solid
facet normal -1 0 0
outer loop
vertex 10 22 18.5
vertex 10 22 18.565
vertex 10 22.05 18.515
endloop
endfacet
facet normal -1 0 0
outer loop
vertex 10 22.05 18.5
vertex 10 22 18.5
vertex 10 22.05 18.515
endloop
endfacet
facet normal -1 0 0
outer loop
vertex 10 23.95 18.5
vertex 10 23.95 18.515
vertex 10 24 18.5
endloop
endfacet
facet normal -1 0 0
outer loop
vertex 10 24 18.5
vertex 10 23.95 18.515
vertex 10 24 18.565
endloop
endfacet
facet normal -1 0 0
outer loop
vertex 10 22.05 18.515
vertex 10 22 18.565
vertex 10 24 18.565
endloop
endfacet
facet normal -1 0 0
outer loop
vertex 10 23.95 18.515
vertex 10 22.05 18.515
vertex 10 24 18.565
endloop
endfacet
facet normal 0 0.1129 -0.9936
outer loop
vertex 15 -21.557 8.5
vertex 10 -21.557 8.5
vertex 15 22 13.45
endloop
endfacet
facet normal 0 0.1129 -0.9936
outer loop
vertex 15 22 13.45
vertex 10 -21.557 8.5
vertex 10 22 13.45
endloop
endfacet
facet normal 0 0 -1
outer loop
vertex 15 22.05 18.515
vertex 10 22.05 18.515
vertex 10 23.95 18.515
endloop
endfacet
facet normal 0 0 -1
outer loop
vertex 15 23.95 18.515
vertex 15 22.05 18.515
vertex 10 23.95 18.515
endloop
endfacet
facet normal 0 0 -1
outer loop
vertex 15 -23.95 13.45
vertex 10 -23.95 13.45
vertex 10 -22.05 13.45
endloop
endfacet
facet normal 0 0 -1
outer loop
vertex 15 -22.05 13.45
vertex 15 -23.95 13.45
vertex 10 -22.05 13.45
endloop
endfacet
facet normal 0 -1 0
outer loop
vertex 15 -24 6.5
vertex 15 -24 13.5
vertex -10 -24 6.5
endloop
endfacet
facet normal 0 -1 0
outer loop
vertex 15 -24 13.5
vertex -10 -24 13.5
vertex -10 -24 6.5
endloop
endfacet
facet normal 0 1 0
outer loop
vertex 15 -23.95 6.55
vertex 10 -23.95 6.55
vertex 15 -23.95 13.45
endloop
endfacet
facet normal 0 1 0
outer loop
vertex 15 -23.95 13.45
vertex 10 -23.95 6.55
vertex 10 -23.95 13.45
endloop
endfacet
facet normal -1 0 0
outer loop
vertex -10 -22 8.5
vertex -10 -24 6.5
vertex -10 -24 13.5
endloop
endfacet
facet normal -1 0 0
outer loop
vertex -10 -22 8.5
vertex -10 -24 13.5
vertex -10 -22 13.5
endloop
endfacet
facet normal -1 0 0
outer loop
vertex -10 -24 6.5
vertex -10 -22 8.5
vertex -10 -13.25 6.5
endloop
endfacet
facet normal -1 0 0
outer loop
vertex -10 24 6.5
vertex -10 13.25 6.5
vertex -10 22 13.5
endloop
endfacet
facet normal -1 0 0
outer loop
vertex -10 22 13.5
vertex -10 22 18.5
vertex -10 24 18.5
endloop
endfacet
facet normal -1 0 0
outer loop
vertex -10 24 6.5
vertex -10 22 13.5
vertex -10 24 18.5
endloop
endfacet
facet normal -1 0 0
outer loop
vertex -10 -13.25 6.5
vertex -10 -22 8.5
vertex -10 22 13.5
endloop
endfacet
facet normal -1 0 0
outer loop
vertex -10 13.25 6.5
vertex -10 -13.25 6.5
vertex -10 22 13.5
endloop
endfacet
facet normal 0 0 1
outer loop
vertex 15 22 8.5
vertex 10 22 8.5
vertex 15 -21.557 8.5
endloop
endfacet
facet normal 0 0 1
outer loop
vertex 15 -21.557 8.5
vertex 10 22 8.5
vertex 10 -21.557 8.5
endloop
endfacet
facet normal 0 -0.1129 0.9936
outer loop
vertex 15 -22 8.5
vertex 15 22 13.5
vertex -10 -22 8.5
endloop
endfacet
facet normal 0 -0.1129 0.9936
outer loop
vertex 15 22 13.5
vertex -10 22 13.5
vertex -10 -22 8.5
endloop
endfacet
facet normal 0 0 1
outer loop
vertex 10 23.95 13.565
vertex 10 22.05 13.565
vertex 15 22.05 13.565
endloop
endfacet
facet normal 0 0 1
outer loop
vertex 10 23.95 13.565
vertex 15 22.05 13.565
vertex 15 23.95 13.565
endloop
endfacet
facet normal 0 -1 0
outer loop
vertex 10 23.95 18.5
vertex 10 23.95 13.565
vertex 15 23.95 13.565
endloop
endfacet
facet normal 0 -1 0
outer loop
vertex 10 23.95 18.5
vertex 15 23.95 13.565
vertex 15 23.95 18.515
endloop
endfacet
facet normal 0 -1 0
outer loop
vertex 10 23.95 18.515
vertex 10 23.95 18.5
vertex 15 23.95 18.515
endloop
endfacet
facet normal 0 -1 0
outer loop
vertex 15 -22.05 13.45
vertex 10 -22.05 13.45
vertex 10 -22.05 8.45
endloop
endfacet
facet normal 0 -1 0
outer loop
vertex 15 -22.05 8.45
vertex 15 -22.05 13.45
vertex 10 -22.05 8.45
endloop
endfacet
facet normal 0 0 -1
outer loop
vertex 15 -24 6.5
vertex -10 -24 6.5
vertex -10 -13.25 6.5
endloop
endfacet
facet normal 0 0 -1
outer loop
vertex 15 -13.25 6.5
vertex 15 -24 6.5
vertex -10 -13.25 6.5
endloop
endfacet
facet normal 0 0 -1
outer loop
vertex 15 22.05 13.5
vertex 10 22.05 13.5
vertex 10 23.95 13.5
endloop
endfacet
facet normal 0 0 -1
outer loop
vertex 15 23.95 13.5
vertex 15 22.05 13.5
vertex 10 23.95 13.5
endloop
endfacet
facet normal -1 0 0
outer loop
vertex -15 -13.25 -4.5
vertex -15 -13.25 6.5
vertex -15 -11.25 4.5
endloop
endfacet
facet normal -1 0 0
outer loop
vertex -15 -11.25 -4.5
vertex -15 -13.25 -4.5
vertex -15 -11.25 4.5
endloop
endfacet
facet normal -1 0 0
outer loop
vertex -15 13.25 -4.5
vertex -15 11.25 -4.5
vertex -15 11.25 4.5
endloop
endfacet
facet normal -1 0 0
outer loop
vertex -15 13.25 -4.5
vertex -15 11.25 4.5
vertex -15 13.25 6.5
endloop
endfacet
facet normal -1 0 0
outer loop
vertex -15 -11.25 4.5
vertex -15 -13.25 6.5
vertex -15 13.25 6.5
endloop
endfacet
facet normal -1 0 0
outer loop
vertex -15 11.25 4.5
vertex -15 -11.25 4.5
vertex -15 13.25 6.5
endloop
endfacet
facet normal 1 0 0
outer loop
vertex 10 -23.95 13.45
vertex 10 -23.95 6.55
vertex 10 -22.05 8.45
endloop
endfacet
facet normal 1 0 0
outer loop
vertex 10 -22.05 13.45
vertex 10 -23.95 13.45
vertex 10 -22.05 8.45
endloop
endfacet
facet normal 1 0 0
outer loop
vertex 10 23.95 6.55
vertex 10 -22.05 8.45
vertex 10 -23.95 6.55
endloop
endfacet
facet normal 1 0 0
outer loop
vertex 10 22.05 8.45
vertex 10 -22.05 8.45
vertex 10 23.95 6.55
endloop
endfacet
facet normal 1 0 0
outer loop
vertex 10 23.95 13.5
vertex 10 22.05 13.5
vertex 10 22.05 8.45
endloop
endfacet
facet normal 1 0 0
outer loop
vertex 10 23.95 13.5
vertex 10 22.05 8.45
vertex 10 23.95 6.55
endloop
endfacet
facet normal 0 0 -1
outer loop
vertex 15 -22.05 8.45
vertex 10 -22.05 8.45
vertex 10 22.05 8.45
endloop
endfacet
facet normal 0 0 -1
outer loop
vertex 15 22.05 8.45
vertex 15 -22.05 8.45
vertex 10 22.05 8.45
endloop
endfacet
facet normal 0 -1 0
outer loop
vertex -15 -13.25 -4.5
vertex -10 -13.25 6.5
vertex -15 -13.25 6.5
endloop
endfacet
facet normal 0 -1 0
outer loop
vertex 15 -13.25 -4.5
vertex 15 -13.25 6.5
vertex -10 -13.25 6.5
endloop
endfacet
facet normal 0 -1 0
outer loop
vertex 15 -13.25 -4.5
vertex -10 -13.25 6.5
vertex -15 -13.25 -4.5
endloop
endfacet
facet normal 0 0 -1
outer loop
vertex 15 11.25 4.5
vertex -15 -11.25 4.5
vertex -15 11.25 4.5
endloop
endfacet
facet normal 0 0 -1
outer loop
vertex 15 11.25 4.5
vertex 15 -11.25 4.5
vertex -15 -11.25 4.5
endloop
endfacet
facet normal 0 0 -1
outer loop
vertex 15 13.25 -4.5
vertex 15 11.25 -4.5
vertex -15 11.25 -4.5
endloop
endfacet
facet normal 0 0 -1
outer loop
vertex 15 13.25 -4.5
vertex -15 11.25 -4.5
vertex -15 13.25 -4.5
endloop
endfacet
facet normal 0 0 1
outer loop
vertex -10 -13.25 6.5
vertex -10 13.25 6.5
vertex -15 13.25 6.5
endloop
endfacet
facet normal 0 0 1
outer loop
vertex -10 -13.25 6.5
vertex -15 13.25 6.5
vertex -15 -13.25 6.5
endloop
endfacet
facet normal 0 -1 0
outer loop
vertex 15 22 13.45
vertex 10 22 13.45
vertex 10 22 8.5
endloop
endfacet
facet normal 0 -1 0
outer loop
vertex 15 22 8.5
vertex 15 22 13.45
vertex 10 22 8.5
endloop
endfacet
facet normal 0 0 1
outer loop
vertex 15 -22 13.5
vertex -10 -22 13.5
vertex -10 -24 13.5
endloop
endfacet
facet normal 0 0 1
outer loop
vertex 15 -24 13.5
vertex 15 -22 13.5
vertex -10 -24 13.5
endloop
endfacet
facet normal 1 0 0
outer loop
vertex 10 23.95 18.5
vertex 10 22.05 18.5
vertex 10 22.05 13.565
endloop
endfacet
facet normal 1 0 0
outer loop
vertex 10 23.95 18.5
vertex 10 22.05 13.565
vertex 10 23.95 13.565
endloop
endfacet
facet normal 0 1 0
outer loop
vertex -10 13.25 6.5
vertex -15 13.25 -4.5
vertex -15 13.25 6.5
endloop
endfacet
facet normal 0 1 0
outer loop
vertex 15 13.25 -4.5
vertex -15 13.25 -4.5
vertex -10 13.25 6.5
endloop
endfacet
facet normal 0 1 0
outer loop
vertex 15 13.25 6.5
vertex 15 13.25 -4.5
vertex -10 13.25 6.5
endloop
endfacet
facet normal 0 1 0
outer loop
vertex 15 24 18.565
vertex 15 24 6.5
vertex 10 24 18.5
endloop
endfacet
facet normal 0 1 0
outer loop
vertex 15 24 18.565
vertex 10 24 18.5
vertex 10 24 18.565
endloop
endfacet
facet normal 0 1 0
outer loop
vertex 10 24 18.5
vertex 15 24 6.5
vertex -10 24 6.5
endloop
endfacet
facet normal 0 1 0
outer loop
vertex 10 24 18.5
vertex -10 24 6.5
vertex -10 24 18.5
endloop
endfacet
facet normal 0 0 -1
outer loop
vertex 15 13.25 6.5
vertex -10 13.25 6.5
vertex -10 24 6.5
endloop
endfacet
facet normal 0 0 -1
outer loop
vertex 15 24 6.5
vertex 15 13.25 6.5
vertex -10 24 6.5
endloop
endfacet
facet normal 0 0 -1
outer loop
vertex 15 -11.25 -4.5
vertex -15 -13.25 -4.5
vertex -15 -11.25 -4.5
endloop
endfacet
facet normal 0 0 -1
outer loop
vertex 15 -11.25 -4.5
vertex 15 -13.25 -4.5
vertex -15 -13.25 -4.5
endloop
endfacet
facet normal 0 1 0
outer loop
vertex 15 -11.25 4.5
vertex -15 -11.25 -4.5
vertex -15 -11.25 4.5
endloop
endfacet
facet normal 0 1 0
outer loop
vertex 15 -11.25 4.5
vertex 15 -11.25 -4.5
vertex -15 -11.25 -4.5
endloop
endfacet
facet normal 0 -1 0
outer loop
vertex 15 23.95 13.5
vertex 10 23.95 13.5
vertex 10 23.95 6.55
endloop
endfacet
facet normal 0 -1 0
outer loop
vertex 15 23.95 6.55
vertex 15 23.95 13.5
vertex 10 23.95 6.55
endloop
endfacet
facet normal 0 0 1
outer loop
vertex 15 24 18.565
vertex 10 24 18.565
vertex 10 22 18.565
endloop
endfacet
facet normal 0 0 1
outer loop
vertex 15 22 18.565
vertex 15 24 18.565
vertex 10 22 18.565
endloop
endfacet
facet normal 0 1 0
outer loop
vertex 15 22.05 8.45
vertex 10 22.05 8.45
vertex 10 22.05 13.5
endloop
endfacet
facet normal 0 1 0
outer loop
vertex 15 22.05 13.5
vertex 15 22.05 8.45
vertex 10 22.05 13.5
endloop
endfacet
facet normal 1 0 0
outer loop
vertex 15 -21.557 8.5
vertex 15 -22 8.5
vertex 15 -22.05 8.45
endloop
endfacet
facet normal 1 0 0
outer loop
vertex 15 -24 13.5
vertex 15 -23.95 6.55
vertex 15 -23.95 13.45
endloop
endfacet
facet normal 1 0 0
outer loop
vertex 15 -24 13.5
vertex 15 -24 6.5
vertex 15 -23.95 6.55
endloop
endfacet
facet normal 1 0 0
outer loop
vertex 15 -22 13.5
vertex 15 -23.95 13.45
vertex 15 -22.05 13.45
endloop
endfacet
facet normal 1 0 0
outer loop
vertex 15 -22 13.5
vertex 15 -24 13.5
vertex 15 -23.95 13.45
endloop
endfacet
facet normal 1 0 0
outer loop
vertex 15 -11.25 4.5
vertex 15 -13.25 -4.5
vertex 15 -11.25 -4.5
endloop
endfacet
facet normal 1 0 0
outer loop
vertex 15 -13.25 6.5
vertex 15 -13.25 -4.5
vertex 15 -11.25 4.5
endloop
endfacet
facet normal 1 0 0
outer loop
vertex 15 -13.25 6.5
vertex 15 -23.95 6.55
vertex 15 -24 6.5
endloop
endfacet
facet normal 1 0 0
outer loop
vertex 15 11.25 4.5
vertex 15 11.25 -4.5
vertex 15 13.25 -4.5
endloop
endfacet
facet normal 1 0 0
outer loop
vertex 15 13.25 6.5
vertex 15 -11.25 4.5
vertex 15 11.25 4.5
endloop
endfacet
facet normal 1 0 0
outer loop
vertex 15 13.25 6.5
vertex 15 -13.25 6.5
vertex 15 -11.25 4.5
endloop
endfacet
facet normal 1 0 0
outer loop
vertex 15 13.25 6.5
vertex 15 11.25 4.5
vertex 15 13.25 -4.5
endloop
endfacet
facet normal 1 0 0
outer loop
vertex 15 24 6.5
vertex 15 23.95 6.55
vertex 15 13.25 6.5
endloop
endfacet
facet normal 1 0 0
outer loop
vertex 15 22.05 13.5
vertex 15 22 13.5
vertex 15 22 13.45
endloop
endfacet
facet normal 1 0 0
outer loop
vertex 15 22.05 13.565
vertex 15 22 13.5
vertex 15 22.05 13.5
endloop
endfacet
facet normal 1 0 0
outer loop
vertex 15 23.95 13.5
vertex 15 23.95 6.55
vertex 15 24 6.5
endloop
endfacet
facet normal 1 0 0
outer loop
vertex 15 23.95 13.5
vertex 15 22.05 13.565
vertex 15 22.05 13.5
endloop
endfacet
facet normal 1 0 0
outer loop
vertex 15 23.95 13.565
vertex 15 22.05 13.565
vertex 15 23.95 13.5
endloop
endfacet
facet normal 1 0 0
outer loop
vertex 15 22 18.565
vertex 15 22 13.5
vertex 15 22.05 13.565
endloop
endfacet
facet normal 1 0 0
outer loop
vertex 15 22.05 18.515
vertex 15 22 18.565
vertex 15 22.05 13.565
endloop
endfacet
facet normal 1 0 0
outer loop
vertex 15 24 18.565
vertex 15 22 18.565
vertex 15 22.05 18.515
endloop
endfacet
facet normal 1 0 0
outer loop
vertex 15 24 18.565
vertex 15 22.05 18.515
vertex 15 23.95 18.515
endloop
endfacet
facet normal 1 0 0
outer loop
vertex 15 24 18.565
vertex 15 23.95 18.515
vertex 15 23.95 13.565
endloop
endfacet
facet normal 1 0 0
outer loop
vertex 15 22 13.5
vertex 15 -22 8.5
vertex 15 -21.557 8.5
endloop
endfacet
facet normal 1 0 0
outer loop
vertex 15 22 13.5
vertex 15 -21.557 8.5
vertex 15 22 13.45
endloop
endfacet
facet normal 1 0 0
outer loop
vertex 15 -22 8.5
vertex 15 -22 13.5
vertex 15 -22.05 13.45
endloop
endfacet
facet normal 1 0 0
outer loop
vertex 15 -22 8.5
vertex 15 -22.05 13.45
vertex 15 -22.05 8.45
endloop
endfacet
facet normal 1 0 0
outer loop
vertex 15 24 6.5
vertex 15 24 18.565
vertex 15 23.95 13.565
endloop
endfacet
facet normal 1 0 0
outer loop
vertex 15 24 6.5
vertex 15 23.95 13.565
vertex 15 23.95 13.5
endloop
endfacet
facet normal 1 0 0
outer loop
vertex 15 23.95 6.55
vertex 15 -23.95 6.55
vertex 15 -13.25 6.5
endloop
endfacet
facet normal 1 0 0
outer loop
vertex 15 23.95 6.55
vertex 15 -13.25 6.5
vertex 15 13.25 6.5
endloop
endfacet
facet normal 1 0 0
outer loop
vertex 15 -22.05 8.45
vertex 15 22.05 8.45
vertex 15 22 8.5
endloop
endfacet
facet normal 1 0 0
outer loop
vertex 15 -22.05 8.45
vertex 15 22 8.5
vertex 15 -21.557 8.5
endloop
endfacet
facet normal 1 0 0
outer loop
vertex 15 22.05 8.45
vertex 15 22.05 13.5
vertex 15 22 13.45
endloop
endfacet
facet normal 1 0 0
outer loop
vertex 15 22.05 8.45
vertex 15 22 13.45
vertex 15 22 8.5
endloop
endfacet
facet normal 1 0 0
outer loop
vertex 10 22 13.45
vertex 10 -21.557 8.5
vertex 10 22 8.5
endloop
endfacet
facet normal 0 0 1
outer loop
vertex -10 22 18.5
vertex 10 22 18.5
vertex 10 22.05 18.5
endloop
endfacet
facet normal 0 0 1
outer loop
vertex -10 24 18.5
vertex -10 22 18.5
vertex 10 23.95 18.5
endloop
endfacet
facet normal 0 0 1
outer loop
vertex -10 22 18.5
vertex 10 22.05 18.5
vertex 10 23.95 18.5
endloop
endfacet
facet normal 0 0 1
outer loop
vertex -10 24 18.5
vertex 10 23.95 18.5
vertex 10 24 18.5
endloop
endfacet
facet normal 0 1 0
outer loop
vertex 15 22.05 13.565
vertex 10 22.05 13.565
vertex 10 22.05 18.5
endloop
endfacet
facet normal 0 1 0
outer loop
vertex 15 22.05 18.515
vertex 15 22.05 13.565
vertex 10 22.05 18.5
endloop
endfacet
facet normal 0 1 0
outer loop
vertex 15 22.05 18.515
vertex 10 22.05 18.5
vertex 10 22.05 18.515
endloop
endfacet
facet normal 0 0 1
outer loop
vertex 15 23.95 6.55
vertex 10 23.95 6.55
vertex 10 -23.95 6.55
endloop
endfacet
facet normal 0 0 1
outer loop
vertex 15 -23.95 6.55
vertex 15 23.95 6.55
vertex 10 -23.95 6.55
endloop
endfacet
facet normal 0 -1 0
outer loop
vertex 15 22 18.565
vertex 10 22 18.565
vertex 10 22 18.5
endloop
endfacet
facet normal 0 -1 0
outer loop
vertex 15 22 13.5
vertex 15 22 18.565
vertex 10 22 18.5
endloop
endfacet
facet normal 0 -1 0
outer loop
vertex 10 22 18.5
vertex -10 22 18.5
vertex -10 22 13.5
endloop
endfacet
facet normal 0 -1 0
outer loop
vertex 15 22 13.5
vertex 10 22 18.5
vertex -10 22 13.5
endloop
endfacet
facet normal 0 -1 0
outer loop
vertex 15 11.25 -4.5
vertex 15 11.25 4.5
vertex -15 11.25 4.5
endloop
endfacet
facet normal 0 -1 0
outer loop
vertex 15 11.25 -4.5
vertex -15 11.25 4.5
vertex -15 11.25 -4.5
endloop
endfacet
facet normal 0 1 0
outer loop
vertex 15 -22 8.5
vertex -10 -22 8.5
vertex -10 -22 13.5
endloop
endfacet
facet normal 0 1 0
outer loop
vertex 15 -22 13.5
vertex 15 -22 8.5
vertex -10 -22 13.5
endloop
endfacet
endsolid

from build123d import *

# Parameters (mm, degrees)
F1_DEPTH = 15
F2_DEPTH = 10
F4_DEPTH = 5
F0_W     = 2
F0_H     = 5
F5_DEPTH = 10
F6_DEPTH = 10
F3_W     = 1.9
F3_H     = 4.95
F7_DEPTH = 5


with BuildPart() as f1:
    # F0 (on Right) → F1 (new body, symmetric)
    with BuildSketch(Plane.YZ):
        Polygon((-11.25, 4.5), (11.25, 4.5), (11.25, -4.5), (13.25, -4.5), (13.25, 6.5), (-13.25, 6.5), (-13.25, -4.5), (-11.25, -4.5), align=None)
    extrude(amount=F1_DEPTH, both=True)

    # F0 (on Right) → F2 (join, symmetric)
    with BuildSketch(Plane.YZ):
        Polygon((-13.25, 6.5), (13.25, 6.5), (24, 6.5), (24, 13.5), (22, 13.5), (22, 8.5), (-22, 8.5), (-22, 13.5), (-24, 13.5), (-24, 6.5), align=None)
    extrude(amount=F2_DEPTH, both=True)

    # F3 (on face) → F4 (join)
    with BuildSketch(Plane.YZ.offset(10)):
        Polygon((-22, 13.5), (-24, 13.5), (-24, 6.5), (-13.25, 6.5), (13.25, 6.5), (24, 6.5), (24, 13.5), (23.95, 13.5), (23.95, 6.55), (-23.95, 6.55), (-23.95, 13.45), (-22.05, 13.45), (-22.05, 8.45), (22.05, 8.45), (22.05, 13.5), (22, 13.5), (22, 13.4496782049), (22.0004976757, 13.449734759), (22, 8.5), (-21.5571682035, 8.5), (-22, 8.5), align=None)
    extrude(amount=F4_DEPTH)

    # F0 (on Right) → F5 (join, symmetric)
    with BuildSketch(Plane.YZ):
        with Locations((23, 16)):
            Rectangle(F0_W, F0_H)
    extrude(amount=F5_DEPTH, both=True)

    # F0 (on Right) → F6 (join, symmetric)
    with BuildSketch(Plane.YZ):
        Polygon((22, 8.5), (22, 13.5), (-22, 8.5), align=None)
    extrude(amount=F6_DEPTH, both=True)

    # F3 (on face) → F7 (join)
    with BuildSketch(Plane.YZ.offset(10)):
        Polygon((22, 18.5646470636), (22, 13.5), (22.05, 13.5), (23.95, 13.5), (24, 13.5), (24, 18.5646470636), align=None)
        with Locations((23, 16.0396470636)):
            Rectangle(F3_W, F3_H, mode=Mode.SUBTRACT)
        Polygon((22, 13.5), (-22, 8.5), (-21.5571682035, 8.5), (22, 13.4496782049), align=None)
    extrude(amount=F7_DEPTH)


solid = f1.part
